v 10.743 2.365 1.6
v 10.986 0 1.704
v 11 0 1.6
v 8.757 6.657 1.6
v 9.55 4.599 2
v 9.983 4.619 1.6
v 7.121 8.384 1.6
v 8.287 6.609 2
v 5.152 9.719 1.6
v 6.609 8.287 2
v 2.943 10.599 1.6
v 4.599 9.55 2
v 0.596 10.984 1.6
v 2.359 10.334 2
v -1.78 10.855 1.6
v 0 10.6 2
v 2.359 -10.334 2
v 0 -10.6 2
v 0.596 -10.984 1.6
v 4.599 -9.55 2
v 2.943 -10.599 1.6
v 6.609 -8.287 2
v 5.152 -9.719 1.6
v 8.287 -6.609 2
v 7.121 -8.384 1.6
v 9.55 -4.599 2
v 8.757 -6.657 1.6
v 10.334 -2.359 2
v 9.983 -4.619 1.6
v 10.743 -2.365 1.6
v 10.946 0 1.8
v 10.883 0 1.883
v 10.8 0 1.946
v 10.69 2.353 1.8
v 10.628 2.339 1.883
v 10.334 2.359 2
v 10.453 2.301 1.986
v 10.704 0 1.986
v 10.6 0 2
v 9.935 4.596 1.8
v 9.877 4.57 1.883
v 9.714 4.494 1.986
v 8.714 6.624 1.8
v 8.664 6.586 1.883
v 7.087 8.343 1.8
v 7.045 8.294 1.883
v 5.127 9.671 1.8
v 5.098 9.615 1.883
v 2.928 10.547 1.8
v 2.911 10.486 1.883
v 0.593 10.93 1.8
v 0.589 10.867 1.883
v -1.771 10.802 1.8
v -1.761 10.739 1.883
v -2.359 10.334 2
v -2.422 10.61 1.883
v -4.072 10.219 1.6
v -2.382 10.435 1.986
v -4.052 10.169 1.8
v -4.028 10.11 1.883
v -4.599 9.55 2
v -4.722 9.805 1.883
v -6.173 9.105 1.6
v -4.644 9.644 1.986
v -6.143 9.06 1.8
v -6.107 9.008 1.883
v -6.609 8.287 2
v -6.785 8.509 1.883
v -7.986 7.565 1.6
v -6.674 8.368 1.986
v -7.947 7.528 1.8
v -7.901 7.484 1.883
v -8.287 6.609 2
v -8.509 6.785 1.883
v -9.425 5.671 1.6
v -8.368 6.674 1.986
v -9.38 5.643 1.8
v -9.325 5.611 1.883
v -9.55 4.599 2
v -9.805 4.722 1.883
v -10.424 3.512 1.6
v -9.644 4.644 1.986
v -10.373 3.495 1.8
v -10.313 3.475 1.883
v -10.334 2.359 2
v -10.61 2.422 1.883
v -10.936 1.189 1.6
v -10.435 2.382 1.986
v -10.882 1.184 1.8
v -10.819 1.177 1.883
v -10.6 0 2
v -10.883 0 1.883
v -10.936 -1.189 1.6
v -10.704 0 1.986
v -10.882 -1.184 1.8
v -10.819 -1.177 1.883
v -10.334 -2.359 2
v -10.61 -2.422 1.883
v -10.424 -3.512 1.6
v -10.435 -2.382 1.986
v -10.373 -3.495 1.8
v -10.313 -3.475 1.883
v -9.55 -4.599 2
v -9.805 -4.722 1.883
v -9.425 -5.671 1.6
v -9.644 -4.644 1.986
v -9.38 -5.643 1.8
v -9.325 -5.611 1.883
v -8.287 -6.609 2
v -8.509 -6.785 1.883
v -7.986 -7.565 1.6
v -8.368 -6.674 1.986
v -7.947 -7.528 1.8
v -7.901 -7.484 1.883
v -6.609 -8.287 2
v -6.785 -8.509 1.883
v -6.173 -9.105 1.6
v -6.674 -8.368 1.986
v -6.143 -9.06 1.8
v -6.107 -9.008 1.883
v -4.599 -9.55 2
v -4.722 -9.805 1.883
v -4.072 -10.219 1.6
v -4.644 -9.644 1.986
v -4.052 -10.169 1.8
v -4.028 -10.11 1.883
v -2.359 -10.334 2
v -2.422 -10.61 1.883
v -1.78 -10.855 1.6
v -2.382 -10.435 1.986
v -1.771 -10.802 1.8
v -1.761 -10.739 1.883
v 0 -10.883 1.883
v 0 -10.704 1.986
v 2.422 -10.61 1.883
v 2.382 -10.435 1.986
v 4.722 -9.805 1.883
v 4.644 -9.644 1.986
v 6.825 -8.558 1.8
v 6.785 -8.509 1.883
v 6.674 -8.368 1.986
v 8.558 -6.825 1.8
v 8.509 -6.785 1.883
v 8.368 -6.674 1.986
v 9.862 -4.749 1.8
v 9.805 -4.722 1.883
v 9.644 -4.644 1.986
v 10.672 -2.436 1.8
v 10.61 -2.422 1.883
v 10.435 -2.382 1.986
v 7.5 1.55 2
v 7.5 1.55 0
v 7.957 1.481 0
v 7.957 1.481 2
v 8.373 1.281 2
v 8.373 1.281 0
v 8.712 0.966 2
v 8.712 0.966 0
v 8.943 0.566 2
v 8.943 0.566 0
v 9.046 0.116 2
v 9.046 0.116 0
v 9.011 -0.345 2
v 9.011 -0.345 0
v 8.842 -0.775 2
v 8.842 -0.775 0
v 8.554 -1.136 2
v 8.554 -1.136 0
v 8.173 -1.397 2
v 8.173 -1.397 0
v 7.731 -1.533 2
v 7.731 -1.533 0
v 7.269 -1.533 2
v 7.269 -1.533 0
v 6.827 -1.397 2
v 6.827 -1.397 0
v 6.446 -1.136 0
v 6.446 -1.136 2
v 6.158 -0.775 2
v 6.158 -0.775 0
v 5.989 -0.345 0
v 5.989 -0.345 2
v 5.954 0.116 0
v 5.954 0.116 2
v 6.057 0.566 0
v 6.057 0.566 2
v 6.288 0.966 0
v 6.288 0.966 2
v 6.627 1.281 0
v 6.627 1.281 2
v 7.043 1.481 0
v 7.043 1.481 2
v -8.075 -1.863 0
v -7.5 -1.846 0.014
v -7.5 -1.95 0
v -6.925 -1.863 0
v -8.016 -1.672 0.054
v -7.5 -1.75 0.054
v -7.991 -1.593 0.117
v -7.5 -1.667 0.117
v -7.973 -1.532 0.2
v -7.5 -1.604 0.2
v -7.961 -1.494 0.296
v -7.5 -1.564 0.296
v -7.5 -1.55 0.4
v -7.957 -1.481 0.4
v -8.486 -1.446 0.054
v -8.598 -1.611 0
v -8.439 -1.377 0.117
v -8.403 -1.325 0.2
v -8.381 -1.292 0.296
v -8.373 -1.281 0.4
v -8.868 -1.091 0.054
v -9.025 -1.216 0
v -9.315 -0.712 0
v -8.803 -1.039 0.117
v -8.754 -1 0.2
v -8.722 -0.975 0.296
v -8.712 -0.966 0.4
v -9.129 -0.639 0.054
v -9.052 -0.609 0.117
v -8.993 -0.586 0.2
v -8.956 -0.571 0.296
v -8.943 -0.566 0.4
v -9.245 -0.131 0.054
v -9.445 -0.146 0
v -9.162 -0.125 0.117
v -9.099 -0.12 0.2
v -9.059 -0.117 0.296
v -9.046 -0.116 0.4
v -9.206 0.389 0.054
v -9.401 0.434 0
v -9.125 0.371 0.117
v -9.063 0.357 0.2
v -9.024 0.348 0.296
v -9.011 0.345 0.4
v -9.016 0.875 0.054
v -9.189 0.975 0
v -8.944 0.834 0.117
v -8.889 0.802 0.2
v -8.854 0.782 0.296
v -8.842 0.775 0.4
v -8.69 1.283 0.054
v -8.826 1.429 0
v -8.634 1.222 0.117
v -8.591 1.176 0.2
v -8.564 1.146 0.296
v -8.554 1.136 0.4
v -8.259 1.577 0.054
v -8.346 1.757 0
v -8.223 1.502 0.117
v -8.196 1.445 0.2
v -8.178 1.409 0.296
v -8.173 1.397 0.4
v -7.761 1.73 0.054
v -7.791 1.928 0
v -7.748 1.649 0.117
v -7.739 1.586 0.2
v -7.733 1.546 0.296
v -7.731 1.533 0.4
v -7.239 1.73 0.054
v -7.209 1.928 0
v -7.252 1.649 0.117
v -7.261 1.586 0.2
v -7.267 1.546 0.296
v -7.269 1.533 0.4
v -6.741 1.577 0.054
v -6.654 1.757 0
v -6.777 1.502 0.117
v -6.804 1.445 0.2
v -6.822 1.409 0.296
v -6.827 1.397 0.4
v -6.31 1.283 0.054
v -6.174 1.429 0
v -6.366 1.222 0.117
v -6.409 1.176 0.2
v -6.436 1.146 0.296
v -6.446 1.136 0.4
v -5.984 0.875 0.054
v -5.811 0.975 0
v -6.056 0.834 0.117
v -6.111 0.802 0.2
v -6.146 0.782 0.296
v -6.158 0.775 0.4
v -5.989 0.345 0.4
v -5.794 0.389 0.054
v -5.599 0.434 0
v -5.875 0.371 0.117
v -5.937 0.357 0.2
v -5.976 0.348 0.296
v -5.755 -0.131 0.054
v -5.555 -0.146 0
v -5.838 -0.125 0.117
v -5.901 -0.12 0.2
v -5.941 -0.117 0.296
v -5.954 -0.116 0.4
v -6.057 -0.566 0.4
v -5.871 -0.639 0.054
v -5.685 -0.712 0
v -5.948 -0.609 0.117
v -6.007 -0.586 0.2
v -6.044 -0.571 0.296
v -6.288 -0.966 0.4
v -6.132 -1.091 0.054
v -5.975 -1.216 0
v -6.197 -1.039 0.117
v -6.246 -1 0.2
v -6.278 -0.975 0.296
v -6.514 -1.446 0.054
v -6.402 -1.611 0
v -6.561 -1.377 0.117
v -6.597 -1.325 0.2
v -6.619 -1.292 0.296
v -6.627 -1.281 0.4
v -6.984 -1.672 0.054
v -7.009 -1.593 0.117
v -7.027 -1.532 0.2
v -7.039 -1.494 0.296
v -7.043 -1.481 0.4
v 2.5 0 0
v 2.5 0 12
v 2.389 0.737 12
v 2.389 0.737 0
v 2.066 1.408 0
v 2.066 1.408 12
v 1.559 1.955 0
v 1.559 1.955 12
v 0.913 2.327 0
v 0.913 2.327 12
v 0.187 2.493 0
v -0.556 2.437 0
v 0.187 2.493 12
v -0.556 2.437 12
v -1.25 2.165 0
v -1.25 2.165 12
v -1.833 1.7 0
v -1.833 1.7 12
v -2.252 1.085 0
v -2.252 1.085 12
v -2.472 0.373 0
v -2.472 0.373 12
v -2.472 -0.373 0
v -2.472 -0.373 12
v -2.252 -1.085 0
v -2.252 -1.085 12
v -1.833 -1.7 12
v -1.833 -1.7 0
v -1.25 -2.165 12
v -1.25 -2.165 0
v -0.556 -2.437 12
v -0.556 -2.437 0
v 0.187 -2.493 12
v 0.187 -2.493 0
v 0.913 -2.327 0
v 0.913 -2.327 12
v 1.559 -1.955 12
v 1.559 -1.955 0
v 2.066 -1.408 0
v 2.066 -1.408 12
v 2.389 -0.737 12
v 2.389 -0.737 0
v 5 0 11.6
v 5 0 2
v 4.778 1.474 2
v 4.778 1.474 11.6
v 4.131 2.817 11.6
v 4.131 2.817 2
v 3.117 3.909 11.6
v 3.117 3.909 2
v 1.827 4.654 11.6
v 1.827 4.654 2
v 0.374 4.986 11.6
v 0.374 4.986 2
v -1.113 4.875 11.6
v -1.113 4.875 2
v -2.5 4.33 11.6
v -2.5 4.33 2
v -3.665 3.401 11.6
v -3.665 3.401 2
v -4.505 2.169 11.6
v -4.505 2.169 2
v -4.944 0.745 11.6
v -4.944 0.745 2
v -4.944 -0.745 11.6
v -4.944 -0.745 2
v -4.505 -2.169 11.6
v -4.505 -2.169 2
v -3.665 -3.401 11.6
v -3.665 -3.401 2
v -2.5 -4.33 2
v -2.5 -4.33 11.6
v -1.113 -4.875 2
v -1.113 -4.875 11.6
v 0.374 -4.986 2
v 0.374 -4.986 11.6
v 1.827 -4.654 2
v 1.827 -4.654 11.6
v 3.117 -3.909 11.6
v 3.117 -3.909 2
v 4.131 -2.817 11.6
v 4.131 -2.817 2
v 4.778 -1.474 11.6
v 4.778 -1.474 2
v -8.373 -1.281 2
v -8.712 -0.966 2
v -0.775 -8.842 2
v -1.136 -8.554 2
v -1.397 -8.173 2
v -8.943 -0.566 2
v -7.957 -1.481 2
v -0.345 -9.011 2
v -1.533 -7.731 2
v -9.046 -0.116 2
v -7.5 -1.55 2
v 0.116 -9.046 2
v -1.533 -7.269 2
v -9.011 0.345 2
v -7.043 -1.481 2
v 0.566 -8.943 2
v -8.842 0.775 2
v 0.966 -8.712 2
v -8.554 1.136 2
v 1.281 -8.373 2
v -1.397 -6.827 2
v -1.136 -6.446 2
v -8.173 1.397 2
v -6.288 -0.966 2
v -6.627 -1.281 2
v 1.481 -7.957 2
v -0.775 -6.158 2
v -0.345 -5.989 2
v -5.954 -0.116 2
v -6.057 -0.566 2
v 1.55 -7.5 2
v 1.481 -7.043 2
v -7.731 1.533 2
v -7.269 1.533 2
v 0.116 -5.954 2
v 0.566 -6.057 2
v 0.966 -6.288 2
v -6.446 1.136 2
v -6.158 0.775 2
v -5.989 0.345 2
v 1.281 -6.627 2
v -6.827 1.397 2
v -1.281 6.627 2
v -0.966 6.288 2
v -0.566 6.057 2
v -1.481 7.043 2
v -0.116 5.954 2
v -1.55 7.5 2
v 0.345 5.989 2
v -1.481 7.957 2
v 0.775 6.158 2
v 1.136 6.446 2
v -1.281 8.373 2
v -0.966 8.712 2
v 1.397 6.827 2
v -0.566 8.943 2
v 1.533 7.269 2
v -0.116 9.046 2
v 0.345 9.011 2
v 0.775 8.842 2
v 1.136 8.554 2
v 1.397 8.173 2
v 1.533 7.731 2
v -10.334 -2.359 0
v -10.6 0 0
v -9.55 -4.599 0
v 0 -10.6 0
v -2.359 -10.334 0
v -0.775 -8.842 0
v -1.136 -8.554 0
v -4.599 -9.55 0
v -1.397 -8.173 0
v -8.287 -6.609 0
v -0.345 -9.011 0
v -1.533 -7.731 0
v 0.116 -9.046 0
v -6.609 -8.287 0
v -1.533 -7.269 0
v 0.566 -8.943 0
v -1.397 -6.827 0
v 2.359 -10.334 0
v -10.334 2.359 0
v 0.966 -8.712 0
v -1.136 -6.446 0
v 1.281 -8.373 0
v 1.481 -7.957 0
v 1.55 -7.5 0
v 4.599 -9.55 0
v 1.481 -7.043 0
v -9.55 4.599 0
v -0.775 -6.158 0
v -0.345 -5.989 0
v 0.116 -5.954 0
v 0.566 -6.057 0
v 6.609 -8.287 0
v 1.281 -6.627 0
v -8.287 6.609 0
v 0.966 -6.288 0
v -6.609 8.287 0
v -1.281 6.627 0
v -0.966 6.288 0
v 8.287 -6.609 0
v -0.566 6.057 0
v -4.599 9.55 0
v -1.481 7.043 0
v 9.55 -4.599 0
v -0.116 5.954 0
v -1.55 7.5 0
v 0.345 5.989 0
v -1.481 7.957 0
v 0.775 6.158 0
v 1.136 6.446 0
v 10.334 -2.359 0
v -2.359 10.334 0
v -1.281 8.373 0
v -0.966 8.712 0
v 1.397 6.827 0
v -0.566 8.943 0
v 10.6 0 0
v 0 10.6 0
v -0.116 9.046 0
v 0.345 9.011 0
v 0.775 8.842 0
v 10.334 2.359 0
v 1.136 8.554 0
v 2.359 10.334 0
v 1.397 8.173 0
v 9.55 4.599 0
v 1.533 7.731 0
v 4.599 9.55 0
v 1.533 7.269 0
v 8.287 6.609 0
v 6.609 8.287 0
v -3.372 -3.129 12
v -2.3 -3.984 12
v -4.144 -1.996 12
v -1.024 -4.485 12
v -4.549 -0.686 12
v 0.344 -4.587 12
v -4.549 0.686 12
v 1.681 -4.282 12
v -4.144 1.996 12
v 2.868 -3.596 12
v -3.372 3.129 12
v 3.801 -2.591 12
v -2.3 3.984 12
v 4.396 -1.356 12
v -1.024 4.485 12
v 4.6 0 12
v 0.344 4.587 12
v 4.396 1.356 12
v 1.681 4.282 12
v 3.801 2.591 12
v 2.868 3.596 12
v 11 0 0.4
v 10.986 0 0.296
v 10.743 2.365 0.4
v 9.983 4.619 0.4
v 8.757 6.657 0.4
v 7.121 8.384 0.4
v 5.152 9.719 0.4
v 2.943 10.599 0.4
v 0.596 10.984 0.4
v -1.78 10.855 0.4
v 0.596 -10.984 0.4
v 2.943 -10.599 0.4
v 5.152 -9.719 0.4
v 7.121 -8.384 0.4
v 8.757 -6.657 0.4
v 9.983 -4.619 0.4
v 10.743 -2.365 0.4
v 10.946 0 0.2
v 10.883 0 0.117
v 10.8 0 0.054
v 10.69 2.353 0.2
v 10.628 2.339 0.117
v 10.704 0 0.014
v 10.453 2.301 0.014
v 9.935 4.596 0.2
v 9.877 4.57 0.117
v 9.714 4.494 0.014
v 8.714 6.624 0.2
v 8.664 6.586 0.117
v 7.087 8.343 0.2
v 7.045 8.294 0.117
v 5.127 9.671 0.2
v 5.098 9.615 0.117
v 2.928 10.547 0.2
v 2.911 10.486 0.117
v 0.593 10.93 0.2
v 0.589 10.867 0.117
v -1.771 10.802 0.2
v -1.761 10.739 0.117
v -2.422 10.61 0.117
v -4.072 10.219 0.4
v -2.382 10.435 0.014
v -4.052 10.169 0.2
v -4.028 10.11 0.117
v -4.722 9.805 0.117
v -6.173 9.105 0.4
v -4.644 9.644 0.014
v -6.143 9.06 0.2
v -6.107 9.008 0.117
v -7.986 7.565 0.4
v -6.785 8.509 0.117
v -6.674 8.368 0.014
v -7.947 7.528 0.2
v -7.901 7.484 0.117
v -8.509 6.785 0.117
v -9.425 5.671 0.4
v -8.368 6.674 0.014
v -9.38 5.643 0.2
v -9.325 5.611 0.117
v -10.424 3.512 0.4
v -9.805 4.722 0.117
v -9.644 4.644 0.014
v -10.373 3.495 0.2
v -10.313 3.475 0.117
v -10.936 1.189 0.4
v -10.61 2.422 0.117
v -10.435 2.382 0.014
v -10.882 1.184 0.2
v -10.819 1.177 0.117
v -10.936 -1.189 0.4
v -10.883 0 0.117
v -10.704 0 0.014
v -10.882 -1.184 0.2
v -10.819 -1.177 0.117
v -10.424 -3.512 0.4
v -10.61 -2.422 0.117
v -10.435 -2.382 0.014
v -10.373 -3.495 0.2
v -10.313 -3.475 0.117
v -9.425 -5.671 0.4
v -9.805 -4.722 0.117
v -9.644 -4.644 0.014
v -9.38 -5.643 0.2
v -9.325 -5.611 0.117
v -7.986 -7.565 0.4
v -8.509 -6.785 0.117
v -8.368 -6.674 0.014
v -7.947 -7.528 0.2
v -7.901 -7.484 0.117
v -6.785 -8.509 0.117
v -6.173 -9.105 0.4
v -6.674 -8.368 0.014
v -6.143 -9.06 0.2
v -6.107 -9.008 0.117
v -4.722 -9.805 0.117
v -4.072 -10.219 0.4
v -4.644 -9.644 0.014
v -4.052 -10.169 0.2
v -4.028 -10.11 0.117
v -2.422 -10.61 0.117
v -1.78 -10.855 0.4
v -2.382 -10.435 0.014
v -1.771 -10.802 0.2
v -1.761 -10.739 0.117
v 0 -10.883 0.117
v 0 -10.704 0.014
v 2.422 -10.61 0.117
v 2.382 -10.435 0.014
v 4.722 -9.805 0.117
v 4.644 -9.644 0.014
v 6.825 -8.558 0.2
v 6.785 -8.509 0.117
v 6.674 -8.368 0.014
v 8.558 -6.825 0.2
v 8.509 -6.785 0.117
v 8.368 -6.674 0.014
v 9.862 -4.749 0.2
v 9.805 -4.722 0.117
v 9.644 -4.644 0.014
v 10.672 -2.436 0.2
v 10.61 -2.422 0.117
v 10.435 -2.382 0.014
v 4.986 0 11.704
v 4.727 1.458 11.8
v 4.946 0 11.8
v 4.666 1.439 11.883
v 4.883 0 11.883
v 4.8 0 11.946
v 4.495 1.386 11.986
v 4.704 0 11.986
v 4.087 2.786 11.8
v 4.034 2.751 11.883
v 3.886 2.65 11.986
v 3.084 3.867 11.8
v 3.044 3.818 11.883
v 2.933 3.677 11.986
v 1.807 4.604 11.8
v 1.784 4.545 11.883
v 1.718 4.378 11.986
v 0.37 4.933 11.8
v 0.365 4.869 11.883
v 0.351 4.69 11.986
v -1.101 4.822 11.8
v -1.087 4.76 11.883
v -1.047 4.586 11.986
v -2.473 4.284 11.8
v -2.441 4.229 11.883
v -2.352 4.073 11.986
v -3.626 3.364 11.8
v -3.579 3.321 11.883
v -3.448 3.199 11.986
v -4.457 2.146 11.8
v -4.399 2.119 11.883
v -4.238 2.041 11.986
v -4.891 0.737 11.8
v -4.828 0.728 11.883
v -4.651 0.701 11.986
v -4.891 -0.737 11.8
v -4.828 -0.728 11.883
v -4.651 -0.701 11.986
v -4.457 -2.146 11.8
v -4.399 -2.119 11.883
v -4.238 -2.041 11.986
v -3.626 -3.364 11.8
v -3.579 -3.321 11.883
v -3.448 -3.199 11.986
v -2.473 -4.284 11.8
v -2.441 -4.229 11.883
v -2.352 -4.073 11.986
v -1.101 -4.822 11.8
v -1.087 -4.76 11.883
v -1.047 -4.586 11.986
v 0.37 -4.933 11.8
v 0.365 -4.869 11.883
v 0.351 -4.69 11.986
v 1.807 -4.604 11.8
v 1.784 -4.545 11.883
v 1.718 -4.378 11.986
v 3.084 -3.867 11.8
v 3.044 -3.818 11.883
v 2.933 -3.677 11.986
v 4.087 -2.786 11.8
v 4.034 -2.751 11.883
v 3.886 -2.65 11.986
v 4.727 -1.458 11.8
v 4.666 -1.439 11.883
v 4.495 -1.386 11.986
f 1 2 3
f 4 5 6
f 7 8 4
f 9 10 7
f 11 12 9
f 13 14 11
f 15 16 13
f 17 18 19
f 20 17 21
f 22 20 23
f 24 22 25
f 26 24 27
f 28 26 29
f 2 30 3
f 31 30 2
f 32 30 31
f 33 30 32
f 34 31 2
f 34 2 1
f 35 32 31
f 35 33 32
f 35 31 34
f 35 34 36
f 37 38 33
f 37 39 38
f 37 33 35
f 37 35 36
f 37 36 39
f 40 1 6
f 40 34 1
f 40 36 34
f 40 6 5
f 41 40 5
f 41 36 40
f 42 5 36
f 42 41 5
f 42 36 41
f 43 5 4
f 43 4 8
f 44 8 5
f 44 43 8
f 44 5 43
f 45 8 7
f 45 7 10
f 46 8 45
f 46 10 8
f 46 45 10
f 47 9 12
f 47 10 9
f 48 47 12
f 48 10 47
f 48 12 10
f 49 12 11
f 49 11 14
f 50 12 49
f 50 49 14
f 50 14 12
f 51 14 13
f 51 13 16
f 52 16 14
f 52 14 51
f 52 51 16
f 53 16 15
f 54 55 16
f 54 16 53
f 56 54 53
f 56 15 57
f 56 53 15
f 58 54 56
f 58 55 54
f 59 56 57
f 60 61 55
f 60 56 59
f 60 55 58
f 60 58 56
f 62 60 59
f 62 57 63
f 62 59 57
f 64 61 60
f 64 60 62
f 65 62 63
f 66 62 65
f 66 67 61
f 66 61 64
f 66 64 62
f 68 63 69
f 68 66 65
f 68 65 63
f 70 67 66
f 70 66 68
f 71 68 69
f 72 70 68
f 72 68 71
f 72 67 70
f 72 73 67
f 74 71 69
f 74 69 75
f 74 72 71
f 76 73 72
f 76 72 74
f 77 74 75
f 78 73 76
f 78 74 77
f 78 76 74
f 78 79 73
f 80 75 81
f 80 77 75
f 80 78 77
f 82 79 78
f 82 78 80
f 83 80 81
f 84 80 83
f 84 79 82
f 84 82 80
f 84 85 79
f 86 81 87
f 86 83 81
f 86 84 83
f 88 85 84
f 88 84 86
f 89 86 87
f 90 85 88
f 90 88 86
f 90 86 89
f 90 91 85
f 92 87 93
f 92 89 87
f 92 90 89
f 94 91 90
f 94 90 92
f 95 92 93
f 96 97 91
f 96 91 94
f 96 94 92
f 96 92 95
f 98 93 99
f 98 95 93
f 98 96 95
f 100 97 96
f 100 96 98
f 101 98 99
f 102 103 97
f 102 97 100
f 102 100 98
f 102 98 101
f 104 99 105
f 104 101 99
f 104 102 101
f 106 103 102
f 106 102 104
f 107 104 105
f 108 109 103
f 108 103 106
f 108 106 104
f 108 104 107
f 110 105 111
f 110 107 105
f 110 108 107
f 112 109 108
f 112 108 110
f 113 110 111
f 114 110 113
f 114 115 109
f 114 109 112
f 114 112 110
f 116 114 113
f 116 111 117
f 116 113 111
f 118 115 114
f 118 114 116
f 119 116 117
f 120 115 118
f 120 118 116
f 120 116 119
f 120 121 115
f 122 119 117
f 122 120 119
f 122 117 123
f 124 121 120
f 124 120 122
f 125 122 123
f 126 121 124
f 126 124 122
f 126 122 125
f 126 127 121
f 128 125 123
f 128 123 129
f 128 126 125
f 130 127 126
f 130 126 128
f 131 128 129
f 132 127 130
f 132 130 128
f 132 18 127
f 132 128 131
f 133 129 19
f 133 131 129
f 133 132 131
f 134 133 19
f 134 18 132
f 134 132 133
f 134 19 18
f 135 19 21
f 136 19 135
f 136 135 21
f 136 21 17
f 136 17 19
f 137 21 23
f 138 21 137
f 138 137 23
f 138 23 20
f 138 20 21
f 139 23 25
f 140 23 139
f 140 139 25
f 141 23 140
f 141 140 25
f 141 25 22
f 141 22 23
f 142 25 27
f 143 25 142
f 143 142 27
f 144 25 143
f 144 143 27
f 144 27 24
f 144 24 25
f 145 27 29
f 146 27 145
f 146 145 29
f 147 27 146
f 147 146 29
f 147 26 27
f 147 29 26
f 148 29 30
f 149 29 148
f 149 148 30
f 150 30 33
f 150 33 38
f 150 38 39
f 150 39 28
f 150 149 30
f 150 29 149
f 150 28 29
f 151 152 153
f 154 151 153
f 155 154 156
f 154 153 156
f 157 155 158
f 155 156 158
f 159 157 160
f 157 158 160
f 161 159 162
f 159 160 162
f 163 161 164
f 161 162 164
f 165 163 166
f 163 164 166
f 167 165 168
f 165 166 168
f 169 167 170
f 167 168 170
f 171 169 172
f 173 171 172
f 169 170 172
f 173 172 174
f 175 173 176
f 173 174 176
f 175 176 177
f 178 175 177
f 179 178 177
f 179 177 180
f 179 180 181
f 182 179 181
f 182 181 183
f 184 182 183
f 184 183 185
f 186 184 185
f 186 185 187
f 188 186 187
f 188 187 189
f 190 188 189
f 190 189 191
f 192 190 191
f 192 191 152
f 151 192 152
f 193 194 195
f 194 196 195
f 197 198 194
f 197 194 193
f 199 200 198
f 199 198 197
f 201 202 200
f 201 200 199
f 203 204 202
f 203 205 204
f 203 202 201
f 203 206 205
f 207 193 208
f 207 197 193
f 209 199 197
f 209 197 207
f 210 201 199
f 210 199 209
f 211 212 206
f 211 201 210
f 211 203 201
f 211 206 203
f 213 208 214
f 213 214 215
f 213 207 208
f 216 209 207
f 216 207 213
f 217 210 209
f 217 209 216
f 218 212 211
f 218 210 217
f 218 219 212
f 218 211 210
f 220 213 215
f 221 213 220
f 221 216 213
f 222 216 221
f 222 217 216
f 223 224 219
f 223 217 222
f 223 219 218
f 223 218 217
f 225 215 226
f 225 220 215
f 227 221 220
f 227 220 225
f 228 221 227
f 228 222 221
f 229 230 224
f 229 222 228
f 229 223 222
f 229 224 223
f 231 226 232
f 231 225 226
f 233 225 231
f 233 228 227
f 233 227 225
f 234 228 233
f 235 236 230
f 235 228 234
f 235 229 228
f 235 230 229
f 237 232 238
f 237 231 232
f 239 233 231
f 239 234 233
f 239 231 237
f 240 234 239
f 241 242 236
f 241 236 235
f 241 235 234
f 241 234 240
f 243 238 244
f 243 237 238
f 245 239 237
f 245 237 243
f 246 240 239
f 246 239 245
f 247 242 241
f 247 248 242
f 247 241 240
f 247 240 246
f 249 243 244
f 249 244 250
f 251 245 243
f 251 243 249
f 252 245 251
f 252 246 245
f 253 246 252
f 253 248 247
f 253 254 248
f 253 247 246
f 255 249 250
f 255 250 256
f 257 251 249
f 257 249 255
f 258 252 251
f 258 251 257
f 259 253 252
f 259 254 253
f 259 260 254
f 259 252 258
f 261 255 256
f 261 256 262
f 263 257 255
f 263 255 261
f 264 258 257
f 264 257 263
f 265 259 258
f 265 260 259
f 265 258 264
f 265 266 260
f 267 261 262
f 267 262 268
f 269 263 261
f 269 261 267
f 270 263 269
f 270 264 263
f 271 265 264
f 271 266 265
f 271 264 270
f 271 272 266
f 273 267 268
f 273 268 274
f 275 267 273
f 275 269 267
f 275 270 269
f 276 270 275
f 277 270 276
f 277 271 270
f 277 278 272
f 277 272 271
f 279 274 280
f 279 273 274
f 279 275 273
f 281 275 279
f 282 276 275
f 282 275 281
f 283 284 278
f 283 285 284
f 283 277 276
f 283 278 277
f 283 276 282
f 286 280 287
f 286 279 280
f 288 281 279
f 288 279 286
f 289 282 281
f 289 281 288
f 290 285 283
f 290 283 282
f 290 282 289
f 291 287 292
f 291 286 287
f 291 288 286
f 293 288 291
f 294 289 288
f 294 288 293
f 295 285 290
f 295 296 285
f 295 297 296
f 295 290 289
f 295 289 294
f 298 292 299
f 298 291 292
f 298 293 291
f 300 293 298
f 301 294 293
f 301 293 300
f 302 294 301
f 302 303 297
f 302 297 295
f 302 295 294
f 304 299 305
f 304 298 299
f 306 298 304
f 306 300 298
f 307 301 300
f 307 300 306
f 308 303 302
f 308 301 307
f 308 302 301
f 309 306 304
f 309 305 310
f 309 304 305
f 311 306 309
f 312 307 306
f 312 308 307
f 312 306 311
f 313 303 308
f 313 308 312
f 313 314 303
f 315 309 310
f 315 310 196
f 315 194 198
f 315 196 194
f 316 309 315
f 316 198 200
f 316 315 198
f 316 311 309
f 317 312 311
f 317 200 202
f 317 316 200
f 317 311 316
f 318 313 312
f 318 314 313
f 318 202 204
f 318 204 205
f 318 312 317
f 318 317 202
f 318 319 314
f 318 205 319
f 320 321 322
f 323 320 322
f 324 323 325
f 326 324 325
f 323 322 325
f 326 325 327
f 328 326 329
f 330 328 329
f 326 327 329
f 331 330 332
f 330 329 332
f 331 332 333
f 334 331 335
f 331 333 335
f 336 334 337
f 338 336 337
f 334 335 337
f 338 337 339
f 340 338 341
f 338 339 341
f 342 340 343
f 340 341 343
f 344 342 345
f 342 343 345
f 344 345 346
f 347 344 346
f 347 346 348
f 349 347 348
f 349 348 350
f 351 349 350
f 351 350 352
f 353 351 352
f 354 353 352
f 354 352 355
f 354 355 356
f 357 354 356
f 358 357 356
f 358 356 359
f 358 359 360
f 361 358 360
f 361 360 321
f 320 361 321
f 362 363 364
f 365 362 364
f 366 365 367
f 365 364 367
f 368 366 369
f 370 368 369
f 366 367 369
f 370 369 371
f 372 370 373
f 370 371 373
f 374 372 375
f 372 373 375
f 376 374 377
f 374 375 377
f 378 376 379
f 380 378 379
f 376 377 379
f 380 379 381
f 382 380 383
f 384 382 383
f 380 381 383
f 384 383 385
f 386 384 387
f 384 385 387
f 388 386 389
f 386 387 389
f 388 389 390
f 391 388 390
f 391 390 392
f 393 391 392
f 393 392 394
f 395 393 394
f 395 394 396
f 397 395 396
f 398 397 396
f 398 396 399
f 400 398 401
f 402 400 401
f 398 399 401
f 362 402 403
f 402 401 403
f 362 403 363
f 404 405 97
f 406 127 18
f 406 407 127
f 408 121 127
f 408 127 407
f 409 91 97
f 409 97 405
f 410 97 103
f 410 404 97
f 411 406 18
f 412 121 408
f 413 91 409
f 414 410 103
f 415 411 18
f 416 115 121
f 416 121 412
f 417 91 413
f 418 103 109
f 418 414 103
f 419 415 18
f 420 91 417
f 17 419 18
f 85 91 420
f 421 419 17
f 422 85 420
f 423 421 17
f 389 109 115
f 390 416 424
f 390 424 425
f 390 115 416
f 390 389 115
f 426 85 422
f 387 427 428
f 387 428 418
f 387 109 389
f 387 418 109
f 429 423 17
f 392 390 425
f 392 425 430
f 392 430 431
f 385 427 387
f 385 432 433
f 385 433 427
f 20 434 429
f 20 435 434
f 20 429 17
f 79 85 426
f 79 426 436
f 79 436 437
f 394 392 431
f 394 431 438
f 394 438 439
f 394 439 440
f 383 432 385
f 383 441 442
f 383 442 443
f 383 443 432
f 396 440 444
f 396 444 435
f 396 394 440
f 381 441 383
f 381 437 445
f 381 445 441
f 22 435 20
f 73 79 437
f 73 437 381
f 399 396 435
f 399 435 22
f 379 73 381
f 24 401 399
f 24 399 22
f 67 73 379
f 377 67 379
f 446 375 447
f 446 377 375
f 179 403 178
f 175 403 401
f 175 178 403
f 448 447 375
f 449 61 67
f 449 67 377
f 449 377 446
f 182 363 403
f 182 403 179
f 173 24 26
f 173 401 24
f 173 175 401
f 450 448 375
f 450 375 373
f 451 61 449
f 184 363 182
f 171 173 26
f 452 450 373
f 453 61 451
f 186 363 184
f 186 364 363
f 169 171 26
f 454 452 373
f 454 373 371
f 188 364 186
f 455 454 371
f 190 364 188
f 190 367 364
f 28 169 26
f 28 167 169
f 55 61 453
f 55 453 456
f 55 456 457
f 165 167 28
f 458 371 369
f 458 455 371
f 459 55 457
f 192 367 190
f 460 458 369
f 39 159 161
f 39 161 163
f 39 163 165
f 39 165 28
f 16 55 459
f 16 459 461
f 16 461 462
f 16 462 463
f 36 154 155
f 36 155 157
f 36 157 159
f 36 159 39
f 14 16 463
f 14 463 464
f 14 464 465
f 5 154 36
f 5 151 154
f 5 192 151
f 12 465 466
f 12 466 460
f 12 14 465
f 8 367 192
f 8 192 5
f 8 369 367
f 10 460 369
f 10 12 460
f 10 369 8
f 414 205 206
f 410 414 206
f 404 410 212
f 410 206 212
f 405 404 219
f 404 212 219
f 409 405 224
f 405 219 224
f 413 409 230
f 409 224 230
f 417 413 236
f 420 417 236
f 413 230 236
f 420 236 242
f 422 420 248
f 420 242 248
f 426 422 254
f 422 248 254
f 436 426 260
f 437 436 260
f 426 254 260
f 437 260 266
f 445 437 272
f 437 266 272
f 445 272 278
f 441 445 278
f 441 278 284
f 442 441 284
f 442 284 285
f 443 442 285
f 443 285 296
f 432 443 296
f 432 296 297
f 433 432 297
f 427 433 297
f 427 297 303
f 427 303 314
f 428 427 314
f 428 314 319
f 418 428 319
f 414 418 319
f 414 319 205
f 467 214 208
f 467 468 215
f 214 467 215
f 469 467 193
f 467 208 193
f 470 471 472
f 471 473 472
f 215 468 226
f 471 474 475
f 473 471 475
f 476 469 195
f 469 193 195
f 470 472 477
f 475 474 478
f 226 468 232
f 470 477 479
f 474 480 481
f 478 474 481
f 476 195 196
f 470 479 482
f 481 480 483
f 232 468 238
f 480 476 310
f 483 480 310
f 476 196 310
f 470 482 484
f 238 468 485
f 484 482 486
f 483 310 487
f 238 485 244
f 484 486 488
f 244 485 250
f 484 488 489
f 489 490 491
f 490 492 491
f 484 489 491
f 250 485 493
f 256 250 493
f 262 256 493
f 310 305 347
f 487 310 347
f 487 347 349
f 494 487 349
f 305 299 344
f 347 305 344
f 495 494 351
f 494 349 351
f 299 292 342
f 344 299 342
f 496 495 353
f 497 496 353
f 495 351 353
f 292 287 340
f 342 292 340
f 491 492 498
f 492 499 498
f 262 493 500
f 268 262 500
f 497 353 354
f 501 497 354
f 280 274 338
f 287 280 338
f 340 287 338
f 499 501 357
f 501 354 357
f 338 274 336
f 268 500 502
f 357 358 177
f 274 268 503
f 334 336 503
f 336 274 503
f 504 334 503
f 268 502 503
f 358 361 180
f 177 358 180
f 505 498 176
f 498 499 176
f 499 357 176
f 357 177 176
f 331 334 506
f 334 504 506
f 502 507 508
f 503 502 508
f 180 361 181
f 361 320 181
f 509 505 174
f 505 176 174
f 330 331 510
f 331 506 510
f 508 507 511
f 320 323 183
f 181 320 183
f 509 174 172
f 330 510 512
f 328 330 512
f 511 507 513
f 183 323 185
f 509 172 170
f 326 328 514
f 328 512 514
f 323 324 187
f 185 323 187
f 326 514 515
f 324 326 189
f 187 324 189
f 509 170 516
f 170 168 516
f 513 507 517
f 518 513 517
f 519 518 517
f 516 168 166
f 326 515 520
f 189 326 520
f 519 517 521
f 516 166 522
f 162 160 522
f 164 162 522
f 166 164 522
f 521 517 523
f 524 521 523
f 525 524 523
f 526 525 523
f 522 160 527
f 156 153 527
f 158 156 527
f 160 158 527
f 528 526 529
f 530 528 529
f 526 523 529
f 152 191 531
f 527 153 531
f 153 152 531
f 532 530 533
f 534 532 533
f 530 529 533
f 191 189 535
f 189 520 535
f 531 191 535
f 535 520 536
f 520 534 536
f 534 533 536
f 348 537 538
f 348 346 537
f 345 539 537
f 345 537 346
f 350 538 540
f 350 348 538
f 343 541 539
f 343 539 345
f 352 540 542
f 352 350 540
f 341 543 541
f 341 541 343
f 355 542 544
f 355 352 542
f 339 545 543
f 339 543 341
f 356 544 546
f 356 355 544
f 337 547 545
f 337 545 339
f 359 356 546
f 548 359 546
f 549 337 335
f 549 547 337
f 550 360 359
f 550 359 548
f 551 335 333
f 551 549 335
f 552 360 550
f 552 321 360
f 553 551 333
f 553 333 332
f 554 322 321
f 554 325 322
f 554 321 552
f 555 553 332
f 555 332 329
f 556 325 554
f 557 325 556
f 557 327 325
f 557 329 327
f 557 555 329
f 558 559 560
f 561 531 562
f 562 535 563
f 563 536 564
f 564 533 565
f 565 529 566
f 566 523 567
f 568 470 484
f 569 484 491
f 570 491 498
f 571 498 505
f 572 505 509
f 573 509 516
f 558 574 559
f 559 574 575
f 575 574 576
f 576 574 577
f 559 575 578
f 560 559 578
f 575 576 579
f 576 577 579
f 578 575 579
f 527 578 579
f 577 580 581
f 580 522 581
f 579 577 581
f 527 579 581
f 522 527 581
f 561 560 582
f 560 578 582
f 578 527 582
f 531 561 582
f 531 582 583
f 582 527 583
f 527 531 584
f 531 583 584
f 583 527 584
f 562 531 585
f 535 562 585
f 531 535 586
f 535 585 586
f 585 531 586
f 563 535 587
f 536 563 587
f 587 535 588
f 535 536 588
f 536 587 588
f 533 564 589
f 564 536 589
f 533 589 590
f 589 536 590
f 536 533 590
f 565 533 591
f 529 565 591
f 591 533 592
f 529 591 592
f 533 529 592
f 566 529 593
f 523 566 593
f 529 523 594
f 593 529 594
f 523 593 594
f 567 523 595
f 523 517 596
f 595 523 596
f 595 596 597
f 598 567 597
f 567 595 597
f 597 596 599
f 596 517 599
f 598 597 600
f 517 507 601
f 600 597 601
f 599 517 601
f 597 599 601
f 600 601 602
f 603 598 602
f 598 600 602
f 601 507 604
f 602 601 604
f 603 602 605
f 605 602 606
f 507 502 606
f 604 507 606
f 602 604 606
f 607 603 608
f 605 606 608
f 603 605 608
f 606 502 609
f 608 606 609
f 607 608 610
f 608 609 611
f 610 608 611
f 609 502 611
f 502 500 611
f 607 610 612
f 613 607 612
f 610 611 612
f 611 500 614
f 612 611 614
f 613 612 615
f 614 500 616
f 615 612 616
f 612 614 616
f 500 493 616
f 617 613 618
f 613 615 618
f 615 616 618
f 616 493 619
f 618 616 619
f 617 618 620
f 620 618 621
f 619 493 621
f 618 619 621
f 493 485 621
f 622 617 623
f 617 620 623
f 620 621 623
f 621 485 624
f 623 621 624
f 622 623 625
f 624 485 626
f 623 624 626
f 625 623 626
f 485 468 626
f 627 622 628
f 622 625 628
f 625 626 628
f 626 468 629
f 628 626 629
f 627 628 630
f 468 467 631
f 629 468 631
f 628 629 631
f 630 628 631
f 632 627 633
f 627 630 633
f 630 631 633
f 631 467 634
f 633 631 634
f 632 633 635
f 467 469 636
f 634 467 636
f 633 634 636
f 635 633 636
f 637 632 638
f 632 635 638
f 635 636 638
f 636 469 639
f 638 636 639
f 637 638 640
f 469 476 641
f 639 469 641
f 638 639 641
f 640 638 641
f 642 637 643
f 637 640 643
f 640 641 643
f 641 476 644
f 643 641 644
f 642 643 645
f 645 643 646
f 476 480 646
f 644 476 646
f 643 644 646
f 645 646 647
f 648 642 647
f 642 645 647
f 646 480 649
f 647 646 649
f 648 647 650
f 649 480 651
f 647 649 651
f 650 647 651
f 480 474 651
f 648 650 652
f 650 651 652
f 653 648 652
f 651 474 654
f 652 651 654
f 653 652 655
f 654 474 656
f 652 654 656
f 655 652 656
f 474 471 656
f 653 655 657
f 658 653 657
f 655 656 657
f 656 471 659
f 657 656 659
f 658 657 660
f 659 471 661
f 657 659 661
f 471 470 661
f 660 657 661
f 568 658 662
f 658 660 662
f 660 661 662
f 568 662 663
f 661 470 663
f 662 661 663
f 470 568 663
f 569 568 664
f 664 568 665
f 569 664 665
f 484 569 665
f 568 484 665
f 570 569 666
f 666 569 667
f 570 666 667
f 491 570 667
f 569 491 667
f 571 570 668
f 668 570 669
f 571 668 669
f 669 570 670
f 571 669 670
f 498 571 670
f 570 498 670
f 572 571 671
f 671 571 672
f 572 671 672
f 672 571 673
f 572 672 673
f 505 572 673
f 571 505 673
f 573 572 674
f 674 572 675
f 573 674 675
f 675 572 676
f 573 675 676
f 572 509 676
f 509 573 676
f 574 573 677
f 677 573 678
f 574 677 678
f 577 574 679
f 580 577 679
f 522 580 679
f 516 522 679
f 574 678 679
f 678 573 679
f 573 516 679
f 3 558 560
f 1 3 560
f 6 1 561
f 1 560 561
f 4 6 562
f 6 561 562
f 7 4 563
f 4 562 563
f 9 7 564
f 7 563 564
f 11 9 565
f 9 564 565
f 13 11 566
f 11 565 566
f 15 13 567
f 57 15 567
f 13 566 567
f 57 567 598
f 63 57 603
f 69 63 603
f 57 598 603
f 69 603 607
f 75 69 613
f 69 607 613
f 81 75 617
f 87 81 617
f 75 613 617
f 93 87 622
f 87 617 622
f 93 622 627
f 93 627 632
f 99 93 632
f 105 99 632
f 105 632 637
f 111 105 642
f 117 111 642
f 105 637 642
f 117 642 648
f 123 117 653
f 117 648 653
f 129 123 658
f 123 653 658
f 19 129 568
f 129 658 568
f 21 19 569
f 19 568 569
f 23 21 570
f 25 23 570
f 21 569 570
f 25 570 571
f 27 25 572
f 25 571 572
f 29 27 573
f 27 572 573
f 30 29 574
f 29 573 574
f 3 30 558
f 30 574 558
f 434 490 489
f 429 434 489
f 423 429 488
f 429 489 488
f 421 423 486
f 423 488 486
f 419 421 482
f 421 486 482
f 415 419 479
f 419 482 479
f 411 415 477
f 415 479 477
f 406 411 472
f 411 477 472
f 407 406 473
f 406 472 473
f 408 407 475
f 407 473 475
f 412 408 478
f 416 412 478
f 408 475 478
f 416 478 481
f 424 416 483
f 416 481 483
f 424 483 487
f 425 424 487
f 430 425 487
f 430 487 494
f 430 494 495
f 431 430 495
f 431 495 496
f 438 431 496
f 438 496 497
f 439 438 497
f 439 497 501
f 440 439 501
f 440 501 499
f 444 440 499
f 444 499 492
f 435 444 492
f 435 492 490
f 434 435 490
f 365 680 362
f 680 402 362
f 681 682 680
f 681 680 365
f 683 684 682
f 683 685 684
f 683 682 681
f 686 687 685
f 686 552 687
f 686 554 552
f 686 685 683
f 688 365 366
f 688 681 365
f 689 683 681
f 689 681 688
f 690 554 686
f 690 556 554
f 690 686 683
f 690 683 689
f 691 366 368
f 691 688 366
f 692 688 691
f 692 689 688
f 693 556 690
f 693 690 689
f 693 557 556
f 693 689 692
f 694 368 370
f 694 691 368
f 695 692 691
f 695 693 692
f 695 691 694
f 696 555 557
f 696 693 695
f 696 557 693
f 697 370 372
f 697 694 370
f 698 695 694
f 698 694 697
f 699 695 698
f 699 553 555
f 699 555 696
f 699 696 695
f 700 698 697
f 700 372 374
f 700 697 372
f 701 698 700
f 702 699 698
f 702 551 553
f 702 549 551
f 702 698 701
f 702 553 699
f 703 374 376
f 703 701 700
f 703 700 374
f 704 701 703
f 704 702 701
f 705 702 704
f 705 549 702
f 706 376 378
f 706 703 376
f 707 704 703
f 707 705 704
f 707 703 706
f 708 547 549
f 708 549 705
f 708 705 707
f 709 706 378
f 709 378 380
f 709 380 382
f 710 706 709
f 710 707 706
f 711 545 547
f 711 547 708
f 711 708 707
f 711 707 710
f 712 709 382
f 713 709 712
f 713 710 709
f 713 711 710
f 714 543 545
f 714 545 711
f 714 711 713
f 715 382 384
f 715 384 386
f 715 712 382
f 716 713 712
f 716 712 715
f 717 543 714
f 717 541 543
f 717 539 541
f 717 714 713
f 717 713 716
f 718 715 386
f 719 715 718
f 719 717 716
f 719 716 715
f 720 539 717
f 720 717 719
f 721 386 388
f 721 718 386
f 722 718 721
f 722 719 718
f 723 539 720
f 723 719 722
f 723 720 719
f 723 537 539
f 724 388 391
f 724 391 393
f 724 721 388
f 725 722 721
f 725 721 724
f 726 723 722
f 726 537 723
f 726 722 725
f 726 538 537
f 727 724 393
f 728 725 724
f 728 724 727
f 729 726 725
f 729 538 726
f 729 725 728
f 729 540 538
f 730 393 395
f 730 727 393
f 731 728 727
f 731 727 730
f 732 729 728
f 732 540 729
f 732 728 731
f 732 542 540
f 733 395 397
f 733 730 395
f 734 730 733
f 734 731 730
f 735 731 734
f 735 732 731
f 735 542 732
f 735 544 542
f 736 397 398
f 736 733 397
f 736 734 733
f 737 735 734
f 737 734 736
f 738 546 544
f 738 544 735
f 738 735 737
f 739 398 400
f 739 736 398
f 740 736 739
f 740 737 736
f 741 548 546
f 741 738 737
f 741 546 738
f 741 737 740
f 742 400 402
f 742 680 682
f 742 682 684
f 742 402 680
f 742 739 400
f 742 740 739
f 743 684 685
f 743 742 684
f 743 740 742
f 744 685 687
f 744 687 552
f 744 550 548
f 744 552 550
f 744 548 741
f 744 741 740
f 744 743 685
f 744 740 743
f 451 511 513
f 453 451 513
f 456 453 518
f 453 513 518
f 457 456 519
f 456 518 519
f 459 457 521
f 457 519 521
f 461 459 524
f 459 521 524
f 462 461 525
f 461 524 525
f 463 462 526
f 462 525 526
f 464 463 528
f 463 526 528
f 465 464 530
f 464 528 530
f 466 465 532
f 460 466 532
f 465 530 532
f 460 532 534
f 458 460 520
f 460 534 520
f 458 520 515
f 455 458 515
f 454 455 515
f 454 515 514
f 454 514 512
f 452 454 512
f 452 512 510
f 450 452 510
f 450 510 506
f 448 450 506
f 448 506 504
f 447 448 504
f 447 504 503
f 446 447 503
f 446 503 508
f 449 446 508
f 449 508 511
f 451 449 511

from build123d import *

# Parameters (mm, degrees)
SKETCH_R           = 11
PAD_DEPTH          = 2
SKETCH001_R        = 5
PAD001_DEPTH       = 10
SKETCH002_R        = 2.5
POCKET_DEPTH       = 12.001
SKETCH003_R        = 1.55
POCKET001_DEPTH    = 78.694328
POLARPATTERN_COUNT = 4
FILLET_R           = 0.4


with BuildPart() as part:
    # Sketch → Pad (new body)
    with BuildSketch(Plane.XY):
        Circle(SKETCH_R)
    extrude(amount=PAD_DEPTH)

    # Sketch001 (on Face3 of Pad) → Pad001 (join)
    with BuildSketch(Plane.XY.offset(2)):
        Circle(SKETCH001_R)
    extrude(amount=PAD001_DEPTH)

    # Sketch002 (on Face5 of Pad001) → Pocket (cut, through all)
    with BuildSketch(Plane.XY.offset(12)):
        Circle(SKETCH002_R)
    extrude(amount=-POCKET_DEPTH, mode=Mode.SUBTRACT)

    # Sketch003 (on Face2 of Pocket) → Pocket001 (cut, through all)
    with BuildSketch(Plane(origin=(0, 0, 0), x_dir=(1, 0, 0), z_dir=(0, 0, -1))):
        with Locations((0, 7.5)):
            Circle(SKETCH003_R)
    pocket001 = extrude(amount=-POCKET001_DEPTH, mode=Mode.SUBTRACT)

    # PolarPattern: Pocket001 ×4 about axis
    polarpattern_axis = Axis((0, 0, 0), (0, 0, -1))
    for i in range(1, POLARPATTERN_COUNT):
        add(pocket001.rotate(polarpattern_axis, i * 360 / POLARPATTERN_COUNT), mode=Mode.SUBTRACT)

    # Fillet
    fillet_edges = [part.edges().sort_by_distance(p)[0] for p in [
        (-5, 0, 12),
        (-7.5, -1.55, 1),
        (-11, 0, 2),
        (-11, 0, 0),
        (-7.5, 1.55, 0),
    ]]
    fillet(fillet_edges, radius=FILLET_R)


solid = part.part
